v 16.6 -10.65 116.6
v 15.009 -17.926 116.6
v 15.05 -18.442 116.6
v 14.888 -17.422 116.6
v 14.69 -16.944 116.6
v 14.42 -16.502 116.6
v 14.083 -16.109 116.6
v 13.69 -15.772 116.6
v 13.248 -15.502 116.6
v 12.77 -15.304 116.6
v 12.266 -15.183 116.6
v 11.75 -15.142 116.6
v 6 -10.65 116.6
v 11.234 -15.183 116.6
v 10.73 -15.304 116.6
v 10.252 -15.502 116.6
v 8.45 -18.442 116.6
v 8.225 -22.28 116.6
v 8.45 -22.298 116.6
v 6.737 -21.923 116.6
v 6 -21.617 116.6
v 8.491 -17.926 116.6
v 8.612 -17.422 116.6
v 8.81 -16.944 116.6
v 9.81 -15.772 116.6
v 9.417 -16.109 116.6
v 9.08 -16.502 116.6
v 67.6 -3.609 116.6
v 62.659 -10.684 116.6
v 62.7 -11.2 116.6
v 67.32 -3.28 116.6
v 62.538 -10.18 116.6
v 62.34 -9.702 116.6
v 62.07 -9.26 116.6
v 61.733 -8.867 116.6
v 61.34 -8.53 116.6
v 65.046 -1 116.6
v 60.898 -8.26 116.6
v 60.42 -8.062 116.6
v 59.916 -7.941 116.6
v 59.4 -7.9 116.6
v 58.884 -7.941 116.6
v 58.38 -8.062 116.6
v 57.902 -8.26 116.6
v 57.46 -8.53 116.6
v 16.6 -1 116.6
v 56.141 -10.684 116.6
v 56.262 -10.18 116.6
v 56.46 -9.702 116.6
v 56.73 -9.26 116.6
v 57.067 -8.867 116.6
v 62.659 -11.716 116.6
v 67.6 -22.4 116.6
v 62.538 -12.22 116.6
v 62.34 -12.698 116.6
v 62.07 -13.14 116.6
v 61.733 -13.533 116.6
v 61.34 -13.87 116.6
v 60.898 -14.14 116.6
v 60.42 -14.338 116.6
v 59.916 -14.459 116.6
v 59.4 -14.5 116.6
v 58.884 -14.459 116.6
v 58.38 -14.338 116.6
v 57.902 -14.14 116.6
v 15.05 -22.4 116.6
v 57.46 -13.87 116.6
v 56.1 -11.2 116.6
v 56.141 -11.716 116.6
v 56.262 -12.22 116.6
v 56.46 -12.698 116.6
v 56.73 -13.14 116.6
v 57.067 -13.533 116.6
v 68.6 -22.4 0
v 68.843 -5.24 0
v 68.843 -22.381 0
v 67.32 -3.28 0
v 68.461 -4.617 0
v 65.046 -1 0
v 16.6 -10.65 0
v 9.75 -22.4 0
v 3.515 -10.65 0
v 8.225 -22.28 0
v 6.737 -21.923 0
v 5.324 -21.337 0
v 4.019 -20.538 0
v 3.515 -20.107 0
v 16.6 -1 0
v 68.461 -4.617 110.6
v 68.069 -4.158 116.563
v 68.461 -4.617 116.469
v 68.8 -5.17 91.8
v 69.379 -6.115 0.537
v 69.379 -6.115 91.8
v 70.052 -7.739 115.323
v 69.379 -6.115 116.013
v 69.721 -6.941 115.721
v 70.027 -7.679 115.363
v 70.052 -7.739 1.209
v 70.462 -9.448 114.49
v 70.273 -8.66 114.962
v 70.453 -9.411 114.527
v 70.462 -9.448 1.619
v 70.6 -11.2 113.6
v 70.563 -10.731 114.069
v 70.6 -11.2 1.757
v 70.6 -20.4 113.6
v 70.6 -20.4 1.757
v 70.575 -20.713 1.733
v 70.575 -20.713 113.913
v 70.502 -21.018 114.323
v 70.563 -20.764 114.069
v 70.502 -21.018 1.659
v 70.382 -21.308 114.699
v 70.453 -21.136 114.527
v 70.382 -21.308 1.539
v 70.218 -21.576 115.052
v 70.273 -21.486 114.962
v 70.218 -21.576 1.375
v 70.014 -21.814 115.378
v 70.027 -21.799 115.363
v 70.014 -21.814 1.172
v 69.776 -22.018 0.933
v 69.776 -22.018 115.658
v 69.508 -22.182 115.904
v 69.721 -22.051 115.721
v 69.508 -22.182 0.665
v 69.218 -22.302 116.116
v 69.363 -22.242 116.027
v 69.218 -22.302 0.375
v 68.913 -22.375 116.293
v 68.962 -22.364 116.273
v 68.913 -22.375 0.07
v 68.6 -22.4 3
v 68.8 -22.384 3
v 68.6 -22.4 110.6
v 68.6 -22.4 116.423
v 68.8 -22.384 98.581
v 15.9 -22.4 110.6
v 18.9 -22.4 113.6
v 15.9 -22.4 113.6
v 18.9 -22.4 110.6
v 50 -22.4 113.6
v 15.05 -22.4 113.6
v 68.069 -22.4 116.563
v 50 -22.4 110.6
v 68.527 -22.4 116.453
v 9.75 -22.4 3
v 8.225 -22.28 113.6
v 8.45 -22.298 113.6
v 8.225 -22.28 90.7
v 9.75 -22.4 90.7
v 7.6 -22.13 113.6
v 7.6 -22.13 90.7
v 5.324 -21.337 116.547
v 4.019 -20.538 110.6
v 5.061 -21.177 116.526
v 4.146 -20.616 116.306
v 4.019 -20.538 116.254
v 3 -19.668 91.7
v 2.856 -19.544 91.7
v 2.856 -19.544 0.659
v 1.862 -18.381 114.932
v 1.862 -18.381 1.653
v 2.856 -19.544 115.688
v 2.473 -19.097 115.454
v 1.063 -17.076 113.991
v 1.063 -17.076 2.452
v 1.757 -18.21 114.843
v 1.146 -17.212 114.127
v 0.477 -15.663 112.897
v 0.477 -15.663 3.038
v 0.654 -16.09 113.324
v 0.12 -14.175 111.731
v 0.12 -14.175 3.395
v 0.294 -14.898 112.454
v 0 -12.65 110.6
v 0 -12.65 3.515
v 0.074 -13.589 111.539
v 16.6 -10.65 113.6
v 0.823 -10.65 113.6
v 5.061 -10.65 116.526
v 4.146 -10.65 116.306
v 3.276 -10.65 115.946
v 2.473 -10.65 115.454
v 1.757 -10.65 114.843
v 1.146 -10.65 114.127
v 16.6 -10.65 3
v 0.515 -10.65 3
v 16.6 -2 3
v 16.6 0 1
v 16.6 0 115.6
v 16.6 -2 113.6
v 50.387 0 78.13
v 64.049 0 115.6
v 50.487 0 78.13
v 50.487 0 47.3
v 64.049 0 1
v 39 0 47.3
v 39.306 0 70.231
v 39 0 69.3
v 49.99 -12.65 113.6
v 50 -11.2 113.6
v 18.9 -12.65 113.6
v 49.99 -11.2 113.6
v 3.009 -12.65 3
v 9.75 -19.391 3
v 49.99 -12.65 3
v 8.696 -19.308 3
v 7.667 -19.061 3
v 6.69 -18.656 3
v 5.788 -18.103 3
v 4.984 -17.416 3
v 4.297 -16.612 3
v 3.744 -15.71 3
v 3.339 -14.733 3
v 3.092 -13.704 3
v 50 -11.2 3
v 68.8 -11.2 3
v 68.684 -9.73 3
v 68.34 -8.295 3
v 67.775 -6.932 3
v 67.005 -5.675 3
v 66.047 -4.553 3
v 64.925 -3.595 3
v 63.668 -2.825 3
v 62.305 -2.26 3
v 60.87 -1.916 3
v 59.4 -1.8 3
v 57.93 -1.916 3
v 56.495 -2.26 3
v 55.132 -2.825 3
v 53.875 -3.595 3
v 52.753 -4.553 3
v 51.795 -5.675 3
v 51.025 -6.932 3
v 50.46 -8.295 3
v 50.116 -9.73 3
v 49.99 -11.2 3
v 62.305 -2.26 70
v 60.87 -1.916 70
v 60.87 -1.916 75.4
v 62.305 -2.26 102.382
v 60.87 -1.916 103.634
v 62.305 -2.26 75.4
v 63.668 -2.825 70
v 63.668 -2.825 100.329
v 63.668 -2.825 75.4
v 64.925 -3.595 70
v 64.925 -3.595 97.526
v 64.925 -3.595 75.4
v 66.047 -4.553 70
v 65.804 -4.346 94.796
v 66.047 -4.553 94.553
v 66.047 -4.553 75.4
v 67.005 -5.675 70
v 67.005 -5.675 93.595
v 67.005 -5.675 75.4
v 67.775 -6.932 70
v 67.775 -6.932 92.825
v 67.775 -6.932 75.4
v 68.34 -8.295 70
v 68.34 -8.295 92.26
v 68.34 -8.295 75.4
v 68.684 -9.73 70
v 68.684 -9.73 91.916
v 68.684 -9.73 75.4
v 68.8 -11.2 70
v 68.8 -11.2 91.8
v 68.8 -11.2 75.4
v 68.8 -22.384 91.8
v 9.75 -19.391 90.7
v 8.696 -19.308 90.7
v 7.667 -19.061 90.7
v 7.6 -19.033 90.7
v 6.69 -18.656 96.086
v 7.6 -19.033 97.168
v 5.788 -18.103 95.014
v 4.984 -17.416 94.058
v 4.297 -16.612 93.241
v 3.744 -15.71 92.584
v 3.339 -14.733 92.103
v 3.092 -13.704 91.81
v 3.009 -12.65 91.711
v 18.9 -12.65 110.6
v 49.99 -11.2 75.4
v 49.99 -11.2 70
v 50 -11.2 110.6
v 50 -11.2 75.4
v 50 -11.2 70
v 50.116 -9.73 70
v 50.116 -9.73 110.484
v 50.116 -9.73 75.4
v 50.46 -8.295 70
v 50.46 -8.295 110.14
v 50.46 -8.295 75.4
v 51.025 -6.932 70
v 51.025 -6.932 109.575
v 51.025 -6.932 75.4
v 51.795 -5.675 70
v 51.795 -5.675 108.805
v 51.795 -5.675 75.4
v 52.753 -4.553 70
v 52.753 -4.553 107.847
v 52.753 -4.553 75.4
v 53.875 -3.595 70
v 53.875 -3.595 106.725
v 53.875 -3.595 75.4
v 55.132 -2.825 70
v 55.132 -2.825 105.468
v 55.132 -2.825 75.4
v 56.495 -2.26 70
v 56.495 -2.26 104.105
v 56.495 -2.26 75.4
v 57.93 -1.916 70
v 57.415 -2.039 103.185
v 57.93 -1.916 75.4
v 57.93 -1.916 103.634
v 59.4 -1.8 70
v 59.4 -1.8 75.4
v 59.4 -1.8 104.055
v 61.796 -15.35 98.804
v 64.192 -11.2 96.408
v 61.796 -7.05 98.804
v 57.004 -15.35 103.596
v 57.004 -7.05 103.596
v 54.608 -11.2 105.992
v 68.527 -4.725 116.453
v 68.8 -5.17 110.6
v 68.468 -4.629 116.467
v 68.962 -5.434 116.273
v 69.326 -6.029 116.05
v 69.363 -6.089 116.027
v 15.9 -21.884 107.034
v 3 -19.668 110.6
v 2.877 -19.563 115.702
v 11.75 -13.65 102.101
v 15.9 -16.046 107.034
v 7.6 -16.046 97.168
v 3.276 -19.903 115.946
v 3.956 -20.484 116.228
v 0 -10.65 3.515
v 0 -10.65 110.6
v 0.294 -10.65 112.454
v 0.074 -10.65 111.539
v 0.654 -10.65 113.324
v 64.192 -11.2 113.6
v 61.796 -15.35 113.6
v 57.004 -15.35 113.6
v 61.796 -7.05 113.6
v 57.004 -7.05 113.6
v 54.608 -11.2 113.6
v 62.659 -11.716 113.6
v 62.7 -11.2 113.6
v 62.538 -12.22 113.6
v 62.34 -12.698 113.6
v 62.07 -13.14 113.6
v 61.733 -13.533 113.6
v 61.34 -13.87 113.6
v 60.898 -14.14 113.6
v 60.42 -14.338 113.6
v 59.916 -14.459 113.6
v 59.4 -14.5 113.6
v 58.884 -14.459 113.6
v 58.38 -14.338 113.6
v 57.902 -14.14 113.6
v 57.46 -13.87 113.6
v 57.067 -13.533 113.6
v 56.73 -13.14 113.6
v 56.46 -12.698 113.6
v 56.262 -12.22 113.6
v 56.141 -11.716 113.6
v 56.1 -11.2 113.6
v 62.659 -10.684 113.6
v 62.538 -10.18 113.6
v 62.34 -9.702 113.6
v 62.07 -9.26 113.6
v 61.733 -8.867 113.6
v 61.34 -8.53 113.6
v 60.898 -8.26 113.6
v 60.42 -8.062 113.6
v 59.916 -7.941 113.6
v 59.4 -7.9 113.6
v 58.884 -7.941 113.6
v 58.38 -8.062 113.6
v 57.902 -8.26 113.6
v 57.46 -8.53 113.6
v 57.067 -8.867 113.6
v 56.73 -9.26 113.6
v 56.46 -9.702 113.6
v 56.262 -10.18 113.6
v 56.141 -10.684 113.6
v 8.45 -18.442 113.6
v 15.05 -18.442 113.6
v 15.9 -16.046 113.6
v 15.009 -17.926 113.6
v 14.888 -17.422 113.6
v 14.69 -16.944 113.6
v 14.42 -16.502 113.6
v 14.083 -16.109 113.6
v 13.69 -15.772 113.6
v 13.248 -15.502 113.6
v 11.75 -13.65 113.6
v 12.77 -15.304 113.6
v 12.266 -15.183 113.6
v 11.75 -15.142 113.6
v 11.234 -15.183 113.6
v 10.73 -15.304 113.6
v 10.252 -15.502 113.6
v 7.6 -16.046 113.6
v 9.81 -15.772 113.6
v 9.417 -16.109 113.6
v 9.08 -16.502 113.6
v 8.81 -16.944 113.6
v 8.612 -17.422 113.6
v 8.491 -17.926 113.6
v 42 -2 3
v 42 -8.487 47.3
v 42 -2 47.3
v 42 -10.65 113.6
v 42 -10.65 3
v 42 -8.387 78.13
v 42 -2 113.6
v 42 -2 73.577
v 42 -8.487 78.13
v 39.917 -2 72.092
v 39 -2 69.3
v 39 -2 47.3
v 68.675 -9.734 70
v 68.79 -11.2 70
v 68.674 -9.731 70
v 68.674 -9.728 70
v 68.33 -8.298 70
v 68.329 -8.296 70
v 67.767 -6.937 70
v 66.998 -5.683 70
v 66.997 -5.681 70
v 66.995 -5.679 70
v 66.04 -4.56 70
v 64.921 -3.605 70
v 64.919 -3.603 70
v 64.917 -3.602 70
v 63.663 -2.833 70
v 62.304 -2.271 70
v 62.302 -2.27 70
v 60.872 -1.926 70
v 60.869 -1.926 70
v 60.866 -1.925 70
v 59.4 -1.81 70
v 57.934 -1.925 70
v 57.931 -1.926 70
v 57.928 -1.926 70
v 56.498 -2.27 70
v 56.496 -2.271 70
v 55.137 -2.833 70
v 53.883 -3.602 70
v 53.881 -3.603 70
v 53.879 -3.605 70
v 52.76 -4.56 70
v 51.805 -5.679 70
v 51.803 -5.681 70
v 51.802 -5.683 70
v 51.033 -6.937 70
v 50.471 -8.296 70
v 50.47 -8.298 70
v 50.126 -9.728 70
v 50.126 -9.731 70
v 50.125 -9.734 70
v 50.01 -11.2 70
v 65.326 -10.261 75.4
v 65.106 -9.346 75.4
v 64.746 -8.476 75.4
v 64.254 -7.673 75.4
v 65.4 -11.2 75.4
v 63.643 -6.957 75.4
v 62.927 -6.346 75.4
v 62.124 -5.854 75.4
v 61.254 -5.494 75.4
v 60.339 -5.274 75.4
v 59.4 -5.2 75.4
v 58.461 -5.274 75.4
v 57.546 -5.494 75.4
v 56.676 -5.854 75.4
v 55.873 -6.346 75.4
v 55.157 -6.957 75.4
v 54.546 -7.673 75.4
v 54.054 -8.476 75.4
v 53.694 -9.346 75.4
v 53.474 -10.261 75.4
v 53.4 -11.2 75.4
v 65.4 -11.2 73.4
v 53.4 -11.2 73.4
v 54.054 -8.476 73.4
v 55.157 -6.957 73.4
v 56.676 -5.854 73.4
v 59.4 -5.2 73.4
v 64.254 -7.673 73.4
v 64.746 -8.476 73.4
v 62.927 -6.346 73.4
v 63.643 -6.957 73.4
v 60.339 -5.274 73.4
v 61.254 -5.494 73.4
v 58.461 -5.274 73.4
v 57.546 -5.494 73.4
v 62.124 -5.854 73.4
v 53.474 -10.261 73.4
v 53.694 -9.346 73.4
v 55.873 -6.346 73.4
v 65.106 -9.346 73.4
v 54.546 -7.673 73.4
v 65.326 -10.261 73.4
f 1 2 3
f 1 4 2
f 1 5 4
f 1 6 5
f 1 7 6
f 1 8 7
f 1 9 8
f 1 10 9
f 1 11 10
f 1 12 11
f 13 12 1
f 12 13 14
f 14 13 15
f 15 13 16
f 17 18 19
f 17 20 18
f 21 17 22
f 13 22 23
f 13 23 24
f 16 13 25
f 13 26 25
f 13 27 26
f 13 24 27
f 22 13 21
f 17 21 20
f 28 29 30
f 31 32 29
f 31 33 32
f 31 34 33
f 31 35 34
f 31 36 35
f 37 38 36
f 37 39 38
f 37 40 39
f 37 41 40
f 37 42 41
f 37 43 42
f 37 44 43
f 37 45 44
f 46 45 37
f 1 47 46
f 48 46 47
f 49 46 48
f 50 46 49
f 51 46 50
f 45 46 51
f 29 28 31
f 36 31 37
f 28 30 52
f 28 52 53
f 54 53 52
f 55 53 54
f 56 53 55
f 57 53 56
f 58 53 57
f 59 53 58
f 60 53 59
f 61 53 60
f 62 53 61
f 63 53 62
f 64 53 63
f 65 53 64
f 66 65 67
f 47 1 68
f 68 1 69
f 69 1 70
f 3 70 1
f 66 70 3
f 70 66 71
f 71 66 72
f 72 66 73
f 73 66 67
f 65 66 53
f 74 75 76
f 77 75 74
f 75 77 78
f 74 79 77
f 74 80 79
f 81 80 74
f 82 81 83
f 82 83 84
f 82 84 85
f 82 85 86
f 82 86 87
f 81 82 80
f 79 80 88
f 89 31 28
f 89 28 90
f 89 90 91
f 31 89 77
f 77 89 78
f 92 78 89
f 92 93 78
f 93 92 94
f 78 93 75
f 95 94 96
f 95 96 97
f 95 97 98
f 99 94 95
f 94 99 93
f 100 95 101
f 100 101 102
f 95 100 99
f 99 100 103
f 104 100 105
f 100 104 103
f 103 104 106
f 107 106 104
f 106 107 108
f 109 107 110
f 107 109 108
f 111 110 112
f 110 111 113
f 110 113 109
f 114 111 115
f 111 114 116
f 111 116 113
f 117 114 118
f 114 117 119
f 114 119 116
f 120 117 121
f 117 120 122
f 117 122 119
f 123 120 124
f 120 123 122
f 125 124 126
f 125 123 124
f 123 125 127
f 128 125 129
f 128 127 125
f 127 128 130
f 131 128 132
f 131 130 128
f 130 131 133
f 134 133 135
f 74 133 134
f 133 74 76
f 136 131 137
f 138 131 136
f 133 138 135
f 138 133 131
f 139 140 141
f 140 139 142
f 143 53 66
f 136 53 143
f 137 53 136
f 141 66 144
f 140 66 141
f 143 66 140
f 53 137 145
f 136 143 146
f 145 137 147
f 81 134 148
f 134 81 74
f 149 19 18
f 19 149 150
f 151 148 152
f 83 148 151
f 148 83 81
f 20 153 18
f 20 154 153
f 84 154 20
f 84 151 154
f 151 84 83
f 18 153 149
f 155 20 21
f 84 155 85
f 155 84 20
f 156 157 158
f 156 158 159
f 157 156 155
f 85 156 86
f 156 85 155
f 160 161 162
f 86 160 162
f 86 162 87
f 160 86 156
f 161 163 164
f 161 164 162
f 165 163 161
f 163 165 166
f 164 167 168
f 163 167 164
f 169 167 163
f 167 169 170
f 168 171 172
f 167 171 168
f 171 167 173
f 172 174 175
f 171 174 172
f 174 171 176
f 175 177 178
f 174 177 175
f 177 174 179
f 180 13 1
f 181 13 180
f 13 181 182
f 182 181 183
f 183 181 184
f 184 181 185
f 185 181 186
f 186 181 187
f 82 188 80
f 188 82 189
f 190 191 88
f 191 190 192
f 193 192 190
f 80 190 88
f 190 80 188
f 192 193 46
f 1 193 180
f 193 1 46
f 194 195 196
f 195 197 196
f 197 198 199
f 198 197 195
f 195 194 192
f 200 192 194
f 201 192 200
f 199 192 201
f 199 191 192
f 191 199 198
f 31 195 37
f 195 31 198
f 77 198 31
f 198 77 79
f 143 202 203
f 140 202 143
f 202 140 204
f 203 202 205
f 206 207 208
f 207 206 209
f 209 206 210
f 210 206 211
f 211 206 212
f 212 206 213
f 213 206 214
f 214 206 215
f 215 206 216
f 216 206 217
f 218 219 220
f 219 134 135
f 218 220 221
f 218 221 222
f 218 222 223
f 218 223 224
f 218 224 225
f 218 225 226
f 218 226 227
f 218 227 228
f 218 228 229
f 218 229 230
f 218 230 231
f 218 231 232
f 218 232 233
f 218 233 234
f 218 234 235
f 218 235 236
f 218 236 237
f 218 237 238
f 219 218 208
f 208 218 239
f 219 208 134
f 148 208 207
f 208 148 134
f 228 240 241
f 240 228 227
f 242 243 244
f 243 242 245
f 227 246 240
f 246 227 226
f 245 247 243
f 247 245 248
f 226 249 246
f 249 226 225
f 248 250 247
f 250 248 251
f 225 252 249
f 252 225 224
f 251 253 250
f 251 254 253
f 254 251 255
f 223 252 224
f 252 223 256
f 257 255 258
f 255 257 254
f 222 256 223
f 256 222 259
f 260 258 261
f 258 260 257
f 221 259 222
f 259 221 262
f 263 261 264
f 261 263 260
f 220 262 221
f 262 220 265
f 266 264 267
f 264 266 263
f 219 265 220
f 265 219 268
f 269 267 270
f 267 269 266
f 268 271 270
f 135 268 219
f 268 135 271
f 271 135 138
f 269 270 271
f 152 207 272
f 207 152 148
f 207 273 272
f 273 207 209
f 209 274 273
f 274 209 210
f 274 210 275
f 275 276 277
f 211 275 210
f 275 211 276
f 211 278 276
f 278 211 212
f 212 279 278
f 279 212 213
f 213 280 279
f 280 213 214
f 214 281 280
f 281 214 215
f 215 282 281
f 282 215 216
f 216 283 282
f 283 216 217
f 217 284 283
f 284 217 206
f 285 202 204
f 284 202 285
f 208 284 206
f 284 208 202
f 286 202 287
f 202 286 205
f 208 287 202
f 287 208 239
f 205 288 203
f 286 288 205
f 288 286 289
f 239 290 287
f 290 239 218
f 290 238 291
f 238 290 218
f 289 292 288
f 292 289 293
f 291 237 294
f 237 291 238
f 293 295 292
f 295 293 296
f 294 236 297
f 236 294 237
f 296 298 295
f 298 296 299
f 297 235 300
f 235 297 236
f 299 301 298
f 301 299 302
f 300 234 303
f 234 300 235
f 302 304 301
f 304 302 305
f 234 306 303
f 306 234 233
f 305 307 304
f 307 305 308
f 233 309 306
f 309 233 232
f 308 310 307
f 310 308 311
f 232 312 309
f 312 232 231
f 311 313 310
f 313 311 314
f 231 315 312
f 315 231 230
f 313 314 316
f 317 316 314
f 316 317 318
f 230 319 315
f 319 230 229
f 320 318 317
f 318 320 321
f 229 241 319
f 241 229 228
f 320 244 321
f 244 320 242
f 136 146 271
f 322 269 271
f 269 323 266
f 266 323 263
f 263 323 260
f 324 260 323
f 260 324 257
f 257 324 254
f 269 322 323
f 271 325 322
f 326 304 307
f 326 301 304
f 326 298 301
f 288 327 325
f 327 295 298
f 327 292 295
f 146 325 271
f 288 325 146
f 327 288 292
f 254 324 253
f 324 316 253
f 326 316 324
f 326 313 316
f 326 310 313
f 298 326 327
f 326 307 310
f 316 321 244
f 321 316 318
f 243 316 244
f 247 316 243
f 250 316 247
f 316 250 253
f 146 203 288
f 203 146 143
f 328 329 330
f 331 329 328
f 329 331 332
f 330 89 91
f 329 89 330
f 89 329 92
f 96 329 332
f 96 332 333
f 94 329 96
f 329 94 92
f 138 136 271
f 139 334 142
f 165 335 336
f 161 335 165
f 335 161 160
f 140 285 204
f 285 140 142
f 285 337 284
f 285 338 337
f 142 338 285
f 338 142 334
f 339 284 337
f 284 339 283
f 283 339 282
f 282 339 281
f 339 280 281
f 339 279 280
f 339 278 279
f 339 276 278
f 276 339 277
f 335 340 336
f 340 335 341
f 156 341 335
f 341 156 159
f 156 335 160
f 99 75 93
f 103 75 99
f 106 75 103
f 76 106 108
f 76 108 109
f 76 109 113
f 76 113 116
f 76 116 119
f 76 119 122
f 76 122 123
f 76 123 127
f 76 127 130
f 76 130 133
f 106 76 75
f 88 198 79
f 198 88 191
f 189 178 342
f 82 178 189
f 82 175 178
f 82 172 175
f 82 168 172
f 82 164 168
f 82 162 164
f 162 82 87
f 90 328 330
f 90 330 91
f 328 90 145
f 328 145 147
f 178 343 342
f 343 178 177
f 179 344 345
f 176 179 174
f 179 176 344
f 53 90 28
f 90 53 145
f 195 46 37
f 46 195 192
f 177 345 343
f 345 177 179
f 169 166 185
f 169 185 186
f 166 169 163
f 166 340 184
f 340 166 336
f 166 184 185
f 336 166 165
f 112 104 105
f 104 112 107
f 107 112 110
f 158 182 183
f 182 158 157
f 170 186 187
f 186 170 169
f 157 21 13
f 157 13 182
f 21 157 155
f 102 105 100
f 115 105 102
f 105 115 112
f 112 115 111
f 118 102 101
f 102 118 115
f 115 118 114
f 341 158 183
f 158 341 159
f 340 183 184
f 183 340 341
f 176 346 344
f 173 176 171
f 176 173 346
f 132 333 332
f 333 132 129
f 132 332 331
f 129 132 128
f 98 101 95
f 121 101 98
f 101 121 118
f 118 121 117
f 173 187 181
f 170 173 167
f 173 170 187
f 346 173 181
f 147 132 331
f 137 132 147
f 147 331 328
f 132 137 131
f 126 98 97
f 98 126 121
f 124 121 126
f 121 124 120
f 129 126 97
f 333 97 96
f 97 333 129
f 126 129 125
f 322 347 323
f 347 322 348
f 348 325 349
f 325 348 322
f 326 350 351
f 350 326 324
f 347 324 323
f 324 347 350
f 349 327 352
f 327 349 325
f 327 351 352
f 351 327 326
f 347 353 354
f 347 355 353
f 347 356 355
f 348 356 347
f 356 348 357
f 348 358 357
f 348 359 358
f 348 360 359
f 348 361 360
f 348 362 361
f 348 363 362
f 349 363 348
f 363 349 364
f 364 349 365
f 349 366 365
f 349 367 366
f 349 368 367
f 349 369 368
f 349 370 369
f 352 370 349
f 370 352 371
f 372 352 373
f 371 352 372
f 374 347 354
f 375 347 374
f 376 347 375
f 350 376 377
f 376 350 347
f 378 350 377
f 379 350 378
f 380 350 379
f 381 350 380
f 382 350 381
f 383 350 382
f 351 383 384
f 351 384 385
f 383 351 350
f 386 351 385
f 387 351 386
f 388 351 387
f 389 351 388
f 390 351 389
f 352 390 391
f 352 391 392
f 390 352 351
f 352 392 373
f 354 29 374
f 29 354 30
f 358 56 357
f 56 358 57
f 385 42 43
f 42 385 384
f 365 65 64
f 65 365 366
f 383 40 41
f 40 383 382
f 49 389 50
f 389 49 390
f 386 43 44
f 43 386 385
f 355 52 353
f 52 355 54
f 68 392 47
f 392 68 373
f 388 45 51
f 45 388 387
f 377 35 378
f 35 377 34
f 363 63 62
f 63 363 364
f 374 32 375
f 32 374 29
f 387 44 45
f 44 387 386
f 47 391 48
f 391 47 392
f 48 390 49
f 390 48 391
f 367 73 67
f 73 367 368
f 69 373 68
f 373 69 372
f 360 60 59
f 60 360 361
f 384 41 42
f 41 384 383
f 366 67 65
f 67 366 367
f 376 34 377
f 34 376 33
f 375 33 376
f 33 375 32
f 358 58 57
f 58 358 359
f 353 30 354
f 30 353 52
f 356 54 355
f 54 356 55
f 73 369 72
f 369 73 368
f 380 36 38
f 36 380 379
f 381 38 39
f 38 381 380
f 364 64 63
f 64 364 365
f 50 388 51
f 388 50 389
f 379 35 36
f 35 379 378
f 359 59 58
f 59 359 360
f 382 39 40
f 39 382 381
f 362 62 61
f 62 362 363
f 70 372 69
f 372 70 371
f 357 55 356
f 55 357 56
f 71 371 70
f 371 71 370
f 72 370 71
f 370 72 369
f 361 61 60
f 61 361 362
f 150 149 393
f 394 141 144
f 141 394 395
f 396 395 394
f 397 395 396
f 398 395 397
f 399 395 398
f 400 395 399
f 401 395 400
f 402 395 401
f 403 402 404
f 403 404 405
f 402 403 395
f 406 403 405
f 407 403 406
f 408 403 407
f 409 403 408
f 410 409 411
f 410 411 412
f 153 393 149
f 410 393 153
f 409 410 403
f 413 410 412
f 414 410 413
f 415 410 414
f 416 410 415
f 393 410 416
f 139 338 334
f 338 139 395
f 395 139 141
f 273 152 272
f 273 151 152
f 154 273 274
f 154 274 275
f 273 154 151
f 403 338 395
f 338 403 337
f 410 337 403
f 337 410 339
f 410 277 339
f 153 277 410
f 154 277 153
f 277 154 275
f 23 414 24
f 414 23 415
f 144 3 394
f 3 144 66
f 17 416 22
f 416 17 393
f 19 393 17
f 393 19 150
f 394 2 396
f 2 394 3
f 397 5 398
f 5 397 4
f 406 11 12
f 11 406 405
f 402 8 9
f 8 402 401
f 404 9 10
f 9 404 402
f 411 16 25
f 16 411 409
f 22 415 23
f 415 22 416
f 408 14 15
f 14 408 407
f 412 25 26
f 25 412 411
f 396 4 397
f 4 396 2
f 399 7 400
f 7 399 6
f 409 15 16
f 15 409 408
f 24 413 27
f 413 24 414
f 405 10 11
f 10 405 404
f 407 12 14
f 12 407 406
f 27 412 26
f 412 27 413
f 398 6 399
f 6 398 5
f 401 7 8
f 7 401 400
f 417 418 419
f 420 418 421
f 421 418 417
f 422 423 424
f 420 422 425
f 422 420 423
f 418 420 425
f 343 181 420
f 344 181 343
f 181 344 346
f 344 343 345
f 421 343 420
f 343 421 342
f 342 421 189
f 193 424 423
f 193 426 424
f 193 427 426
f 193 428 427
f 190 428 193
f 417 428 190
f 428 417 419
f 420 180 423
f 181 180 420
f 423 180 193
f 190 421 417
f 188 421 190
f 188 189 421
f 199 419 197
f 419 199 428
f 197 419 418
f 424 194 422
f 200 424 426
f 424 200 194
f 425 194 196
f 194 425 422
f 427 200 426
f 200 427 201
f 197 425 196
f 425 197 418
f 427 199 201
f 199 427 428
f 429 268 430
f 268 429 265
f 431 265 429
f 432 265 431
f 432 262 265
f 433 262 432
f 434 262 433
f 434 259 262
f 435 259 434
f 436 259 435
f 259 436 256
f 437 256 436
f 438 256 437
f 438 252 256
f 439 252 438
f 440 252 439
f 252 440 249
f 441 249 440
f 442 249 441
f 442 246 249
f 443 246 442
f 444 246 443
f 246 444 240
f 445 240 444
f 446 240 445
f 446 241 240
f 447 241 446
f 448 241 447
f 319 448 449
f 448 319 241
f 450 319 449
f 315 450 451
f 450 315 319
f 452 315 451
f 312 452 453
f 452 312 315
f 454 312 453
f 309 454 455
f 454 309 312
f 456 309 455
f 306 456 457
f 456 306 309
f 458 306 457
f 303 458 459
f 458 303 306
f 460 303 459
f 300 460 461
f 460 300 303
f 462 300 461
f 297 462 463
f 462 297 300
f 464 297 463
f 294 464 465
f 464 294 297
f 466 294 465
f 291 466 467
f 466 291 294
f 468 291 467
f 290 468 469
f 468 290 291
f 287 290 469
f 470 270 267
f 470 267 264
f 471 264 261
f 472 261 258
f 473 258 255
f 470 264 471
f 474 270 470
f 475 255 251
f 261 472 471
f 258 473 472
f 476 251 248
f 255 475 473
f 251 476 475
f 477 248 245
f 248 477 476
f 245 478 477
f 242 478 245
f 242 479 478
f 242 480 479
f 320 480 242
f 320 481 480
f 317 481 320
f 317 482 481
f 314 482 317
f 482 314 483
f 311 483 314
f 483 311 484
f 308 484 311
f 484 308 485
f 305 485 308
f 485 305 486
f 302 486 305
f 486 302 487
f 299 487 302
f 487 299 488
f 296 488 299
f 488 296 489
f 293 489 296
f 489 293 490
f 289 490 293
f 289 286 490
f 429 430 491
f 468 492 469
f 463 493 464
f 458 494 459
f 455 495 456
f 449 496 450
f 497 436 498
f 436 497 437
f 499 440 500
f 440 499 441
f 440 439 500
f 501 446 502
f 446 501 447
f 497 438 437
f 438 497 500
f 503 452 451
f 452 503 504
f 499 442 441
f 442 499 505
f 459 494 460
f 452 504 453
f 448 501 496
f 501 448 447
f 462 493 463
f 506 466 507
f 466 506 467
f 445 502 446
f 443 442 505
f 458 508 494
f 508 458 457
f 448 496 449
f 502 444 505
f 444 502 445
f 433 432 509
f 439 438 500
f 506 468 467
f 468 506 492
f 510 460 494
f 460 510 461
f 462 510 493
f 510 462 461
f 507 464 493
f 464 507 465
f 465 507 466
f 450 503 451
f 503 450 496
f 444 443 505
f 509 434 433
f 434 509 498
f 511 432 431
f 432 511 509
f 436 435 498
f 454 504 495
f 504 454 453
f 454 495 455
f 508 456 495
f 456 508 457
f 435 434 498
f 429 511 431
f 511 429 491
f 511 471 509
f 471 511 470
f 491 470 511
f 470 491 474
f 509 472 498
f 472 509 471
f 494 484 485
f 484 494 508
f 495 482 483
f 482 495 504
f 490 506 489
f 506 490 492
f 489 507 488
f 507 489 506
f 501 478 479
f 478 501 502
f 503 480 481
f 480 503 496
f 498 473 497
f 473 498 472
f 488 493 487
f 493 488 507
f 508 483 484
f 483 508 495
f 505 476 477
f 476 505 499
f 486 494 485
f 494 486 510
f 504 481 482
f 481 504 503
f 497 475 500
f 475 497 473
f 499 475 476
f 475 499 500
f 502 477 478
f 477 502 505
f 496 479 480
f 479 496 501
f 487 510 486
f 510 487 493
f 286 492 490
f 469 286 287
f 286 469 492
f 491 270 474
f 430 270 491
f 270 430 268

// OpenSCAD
include <../lib/kobo-meshcore-case-lib.scad>;
$fn = 40;
grip();
